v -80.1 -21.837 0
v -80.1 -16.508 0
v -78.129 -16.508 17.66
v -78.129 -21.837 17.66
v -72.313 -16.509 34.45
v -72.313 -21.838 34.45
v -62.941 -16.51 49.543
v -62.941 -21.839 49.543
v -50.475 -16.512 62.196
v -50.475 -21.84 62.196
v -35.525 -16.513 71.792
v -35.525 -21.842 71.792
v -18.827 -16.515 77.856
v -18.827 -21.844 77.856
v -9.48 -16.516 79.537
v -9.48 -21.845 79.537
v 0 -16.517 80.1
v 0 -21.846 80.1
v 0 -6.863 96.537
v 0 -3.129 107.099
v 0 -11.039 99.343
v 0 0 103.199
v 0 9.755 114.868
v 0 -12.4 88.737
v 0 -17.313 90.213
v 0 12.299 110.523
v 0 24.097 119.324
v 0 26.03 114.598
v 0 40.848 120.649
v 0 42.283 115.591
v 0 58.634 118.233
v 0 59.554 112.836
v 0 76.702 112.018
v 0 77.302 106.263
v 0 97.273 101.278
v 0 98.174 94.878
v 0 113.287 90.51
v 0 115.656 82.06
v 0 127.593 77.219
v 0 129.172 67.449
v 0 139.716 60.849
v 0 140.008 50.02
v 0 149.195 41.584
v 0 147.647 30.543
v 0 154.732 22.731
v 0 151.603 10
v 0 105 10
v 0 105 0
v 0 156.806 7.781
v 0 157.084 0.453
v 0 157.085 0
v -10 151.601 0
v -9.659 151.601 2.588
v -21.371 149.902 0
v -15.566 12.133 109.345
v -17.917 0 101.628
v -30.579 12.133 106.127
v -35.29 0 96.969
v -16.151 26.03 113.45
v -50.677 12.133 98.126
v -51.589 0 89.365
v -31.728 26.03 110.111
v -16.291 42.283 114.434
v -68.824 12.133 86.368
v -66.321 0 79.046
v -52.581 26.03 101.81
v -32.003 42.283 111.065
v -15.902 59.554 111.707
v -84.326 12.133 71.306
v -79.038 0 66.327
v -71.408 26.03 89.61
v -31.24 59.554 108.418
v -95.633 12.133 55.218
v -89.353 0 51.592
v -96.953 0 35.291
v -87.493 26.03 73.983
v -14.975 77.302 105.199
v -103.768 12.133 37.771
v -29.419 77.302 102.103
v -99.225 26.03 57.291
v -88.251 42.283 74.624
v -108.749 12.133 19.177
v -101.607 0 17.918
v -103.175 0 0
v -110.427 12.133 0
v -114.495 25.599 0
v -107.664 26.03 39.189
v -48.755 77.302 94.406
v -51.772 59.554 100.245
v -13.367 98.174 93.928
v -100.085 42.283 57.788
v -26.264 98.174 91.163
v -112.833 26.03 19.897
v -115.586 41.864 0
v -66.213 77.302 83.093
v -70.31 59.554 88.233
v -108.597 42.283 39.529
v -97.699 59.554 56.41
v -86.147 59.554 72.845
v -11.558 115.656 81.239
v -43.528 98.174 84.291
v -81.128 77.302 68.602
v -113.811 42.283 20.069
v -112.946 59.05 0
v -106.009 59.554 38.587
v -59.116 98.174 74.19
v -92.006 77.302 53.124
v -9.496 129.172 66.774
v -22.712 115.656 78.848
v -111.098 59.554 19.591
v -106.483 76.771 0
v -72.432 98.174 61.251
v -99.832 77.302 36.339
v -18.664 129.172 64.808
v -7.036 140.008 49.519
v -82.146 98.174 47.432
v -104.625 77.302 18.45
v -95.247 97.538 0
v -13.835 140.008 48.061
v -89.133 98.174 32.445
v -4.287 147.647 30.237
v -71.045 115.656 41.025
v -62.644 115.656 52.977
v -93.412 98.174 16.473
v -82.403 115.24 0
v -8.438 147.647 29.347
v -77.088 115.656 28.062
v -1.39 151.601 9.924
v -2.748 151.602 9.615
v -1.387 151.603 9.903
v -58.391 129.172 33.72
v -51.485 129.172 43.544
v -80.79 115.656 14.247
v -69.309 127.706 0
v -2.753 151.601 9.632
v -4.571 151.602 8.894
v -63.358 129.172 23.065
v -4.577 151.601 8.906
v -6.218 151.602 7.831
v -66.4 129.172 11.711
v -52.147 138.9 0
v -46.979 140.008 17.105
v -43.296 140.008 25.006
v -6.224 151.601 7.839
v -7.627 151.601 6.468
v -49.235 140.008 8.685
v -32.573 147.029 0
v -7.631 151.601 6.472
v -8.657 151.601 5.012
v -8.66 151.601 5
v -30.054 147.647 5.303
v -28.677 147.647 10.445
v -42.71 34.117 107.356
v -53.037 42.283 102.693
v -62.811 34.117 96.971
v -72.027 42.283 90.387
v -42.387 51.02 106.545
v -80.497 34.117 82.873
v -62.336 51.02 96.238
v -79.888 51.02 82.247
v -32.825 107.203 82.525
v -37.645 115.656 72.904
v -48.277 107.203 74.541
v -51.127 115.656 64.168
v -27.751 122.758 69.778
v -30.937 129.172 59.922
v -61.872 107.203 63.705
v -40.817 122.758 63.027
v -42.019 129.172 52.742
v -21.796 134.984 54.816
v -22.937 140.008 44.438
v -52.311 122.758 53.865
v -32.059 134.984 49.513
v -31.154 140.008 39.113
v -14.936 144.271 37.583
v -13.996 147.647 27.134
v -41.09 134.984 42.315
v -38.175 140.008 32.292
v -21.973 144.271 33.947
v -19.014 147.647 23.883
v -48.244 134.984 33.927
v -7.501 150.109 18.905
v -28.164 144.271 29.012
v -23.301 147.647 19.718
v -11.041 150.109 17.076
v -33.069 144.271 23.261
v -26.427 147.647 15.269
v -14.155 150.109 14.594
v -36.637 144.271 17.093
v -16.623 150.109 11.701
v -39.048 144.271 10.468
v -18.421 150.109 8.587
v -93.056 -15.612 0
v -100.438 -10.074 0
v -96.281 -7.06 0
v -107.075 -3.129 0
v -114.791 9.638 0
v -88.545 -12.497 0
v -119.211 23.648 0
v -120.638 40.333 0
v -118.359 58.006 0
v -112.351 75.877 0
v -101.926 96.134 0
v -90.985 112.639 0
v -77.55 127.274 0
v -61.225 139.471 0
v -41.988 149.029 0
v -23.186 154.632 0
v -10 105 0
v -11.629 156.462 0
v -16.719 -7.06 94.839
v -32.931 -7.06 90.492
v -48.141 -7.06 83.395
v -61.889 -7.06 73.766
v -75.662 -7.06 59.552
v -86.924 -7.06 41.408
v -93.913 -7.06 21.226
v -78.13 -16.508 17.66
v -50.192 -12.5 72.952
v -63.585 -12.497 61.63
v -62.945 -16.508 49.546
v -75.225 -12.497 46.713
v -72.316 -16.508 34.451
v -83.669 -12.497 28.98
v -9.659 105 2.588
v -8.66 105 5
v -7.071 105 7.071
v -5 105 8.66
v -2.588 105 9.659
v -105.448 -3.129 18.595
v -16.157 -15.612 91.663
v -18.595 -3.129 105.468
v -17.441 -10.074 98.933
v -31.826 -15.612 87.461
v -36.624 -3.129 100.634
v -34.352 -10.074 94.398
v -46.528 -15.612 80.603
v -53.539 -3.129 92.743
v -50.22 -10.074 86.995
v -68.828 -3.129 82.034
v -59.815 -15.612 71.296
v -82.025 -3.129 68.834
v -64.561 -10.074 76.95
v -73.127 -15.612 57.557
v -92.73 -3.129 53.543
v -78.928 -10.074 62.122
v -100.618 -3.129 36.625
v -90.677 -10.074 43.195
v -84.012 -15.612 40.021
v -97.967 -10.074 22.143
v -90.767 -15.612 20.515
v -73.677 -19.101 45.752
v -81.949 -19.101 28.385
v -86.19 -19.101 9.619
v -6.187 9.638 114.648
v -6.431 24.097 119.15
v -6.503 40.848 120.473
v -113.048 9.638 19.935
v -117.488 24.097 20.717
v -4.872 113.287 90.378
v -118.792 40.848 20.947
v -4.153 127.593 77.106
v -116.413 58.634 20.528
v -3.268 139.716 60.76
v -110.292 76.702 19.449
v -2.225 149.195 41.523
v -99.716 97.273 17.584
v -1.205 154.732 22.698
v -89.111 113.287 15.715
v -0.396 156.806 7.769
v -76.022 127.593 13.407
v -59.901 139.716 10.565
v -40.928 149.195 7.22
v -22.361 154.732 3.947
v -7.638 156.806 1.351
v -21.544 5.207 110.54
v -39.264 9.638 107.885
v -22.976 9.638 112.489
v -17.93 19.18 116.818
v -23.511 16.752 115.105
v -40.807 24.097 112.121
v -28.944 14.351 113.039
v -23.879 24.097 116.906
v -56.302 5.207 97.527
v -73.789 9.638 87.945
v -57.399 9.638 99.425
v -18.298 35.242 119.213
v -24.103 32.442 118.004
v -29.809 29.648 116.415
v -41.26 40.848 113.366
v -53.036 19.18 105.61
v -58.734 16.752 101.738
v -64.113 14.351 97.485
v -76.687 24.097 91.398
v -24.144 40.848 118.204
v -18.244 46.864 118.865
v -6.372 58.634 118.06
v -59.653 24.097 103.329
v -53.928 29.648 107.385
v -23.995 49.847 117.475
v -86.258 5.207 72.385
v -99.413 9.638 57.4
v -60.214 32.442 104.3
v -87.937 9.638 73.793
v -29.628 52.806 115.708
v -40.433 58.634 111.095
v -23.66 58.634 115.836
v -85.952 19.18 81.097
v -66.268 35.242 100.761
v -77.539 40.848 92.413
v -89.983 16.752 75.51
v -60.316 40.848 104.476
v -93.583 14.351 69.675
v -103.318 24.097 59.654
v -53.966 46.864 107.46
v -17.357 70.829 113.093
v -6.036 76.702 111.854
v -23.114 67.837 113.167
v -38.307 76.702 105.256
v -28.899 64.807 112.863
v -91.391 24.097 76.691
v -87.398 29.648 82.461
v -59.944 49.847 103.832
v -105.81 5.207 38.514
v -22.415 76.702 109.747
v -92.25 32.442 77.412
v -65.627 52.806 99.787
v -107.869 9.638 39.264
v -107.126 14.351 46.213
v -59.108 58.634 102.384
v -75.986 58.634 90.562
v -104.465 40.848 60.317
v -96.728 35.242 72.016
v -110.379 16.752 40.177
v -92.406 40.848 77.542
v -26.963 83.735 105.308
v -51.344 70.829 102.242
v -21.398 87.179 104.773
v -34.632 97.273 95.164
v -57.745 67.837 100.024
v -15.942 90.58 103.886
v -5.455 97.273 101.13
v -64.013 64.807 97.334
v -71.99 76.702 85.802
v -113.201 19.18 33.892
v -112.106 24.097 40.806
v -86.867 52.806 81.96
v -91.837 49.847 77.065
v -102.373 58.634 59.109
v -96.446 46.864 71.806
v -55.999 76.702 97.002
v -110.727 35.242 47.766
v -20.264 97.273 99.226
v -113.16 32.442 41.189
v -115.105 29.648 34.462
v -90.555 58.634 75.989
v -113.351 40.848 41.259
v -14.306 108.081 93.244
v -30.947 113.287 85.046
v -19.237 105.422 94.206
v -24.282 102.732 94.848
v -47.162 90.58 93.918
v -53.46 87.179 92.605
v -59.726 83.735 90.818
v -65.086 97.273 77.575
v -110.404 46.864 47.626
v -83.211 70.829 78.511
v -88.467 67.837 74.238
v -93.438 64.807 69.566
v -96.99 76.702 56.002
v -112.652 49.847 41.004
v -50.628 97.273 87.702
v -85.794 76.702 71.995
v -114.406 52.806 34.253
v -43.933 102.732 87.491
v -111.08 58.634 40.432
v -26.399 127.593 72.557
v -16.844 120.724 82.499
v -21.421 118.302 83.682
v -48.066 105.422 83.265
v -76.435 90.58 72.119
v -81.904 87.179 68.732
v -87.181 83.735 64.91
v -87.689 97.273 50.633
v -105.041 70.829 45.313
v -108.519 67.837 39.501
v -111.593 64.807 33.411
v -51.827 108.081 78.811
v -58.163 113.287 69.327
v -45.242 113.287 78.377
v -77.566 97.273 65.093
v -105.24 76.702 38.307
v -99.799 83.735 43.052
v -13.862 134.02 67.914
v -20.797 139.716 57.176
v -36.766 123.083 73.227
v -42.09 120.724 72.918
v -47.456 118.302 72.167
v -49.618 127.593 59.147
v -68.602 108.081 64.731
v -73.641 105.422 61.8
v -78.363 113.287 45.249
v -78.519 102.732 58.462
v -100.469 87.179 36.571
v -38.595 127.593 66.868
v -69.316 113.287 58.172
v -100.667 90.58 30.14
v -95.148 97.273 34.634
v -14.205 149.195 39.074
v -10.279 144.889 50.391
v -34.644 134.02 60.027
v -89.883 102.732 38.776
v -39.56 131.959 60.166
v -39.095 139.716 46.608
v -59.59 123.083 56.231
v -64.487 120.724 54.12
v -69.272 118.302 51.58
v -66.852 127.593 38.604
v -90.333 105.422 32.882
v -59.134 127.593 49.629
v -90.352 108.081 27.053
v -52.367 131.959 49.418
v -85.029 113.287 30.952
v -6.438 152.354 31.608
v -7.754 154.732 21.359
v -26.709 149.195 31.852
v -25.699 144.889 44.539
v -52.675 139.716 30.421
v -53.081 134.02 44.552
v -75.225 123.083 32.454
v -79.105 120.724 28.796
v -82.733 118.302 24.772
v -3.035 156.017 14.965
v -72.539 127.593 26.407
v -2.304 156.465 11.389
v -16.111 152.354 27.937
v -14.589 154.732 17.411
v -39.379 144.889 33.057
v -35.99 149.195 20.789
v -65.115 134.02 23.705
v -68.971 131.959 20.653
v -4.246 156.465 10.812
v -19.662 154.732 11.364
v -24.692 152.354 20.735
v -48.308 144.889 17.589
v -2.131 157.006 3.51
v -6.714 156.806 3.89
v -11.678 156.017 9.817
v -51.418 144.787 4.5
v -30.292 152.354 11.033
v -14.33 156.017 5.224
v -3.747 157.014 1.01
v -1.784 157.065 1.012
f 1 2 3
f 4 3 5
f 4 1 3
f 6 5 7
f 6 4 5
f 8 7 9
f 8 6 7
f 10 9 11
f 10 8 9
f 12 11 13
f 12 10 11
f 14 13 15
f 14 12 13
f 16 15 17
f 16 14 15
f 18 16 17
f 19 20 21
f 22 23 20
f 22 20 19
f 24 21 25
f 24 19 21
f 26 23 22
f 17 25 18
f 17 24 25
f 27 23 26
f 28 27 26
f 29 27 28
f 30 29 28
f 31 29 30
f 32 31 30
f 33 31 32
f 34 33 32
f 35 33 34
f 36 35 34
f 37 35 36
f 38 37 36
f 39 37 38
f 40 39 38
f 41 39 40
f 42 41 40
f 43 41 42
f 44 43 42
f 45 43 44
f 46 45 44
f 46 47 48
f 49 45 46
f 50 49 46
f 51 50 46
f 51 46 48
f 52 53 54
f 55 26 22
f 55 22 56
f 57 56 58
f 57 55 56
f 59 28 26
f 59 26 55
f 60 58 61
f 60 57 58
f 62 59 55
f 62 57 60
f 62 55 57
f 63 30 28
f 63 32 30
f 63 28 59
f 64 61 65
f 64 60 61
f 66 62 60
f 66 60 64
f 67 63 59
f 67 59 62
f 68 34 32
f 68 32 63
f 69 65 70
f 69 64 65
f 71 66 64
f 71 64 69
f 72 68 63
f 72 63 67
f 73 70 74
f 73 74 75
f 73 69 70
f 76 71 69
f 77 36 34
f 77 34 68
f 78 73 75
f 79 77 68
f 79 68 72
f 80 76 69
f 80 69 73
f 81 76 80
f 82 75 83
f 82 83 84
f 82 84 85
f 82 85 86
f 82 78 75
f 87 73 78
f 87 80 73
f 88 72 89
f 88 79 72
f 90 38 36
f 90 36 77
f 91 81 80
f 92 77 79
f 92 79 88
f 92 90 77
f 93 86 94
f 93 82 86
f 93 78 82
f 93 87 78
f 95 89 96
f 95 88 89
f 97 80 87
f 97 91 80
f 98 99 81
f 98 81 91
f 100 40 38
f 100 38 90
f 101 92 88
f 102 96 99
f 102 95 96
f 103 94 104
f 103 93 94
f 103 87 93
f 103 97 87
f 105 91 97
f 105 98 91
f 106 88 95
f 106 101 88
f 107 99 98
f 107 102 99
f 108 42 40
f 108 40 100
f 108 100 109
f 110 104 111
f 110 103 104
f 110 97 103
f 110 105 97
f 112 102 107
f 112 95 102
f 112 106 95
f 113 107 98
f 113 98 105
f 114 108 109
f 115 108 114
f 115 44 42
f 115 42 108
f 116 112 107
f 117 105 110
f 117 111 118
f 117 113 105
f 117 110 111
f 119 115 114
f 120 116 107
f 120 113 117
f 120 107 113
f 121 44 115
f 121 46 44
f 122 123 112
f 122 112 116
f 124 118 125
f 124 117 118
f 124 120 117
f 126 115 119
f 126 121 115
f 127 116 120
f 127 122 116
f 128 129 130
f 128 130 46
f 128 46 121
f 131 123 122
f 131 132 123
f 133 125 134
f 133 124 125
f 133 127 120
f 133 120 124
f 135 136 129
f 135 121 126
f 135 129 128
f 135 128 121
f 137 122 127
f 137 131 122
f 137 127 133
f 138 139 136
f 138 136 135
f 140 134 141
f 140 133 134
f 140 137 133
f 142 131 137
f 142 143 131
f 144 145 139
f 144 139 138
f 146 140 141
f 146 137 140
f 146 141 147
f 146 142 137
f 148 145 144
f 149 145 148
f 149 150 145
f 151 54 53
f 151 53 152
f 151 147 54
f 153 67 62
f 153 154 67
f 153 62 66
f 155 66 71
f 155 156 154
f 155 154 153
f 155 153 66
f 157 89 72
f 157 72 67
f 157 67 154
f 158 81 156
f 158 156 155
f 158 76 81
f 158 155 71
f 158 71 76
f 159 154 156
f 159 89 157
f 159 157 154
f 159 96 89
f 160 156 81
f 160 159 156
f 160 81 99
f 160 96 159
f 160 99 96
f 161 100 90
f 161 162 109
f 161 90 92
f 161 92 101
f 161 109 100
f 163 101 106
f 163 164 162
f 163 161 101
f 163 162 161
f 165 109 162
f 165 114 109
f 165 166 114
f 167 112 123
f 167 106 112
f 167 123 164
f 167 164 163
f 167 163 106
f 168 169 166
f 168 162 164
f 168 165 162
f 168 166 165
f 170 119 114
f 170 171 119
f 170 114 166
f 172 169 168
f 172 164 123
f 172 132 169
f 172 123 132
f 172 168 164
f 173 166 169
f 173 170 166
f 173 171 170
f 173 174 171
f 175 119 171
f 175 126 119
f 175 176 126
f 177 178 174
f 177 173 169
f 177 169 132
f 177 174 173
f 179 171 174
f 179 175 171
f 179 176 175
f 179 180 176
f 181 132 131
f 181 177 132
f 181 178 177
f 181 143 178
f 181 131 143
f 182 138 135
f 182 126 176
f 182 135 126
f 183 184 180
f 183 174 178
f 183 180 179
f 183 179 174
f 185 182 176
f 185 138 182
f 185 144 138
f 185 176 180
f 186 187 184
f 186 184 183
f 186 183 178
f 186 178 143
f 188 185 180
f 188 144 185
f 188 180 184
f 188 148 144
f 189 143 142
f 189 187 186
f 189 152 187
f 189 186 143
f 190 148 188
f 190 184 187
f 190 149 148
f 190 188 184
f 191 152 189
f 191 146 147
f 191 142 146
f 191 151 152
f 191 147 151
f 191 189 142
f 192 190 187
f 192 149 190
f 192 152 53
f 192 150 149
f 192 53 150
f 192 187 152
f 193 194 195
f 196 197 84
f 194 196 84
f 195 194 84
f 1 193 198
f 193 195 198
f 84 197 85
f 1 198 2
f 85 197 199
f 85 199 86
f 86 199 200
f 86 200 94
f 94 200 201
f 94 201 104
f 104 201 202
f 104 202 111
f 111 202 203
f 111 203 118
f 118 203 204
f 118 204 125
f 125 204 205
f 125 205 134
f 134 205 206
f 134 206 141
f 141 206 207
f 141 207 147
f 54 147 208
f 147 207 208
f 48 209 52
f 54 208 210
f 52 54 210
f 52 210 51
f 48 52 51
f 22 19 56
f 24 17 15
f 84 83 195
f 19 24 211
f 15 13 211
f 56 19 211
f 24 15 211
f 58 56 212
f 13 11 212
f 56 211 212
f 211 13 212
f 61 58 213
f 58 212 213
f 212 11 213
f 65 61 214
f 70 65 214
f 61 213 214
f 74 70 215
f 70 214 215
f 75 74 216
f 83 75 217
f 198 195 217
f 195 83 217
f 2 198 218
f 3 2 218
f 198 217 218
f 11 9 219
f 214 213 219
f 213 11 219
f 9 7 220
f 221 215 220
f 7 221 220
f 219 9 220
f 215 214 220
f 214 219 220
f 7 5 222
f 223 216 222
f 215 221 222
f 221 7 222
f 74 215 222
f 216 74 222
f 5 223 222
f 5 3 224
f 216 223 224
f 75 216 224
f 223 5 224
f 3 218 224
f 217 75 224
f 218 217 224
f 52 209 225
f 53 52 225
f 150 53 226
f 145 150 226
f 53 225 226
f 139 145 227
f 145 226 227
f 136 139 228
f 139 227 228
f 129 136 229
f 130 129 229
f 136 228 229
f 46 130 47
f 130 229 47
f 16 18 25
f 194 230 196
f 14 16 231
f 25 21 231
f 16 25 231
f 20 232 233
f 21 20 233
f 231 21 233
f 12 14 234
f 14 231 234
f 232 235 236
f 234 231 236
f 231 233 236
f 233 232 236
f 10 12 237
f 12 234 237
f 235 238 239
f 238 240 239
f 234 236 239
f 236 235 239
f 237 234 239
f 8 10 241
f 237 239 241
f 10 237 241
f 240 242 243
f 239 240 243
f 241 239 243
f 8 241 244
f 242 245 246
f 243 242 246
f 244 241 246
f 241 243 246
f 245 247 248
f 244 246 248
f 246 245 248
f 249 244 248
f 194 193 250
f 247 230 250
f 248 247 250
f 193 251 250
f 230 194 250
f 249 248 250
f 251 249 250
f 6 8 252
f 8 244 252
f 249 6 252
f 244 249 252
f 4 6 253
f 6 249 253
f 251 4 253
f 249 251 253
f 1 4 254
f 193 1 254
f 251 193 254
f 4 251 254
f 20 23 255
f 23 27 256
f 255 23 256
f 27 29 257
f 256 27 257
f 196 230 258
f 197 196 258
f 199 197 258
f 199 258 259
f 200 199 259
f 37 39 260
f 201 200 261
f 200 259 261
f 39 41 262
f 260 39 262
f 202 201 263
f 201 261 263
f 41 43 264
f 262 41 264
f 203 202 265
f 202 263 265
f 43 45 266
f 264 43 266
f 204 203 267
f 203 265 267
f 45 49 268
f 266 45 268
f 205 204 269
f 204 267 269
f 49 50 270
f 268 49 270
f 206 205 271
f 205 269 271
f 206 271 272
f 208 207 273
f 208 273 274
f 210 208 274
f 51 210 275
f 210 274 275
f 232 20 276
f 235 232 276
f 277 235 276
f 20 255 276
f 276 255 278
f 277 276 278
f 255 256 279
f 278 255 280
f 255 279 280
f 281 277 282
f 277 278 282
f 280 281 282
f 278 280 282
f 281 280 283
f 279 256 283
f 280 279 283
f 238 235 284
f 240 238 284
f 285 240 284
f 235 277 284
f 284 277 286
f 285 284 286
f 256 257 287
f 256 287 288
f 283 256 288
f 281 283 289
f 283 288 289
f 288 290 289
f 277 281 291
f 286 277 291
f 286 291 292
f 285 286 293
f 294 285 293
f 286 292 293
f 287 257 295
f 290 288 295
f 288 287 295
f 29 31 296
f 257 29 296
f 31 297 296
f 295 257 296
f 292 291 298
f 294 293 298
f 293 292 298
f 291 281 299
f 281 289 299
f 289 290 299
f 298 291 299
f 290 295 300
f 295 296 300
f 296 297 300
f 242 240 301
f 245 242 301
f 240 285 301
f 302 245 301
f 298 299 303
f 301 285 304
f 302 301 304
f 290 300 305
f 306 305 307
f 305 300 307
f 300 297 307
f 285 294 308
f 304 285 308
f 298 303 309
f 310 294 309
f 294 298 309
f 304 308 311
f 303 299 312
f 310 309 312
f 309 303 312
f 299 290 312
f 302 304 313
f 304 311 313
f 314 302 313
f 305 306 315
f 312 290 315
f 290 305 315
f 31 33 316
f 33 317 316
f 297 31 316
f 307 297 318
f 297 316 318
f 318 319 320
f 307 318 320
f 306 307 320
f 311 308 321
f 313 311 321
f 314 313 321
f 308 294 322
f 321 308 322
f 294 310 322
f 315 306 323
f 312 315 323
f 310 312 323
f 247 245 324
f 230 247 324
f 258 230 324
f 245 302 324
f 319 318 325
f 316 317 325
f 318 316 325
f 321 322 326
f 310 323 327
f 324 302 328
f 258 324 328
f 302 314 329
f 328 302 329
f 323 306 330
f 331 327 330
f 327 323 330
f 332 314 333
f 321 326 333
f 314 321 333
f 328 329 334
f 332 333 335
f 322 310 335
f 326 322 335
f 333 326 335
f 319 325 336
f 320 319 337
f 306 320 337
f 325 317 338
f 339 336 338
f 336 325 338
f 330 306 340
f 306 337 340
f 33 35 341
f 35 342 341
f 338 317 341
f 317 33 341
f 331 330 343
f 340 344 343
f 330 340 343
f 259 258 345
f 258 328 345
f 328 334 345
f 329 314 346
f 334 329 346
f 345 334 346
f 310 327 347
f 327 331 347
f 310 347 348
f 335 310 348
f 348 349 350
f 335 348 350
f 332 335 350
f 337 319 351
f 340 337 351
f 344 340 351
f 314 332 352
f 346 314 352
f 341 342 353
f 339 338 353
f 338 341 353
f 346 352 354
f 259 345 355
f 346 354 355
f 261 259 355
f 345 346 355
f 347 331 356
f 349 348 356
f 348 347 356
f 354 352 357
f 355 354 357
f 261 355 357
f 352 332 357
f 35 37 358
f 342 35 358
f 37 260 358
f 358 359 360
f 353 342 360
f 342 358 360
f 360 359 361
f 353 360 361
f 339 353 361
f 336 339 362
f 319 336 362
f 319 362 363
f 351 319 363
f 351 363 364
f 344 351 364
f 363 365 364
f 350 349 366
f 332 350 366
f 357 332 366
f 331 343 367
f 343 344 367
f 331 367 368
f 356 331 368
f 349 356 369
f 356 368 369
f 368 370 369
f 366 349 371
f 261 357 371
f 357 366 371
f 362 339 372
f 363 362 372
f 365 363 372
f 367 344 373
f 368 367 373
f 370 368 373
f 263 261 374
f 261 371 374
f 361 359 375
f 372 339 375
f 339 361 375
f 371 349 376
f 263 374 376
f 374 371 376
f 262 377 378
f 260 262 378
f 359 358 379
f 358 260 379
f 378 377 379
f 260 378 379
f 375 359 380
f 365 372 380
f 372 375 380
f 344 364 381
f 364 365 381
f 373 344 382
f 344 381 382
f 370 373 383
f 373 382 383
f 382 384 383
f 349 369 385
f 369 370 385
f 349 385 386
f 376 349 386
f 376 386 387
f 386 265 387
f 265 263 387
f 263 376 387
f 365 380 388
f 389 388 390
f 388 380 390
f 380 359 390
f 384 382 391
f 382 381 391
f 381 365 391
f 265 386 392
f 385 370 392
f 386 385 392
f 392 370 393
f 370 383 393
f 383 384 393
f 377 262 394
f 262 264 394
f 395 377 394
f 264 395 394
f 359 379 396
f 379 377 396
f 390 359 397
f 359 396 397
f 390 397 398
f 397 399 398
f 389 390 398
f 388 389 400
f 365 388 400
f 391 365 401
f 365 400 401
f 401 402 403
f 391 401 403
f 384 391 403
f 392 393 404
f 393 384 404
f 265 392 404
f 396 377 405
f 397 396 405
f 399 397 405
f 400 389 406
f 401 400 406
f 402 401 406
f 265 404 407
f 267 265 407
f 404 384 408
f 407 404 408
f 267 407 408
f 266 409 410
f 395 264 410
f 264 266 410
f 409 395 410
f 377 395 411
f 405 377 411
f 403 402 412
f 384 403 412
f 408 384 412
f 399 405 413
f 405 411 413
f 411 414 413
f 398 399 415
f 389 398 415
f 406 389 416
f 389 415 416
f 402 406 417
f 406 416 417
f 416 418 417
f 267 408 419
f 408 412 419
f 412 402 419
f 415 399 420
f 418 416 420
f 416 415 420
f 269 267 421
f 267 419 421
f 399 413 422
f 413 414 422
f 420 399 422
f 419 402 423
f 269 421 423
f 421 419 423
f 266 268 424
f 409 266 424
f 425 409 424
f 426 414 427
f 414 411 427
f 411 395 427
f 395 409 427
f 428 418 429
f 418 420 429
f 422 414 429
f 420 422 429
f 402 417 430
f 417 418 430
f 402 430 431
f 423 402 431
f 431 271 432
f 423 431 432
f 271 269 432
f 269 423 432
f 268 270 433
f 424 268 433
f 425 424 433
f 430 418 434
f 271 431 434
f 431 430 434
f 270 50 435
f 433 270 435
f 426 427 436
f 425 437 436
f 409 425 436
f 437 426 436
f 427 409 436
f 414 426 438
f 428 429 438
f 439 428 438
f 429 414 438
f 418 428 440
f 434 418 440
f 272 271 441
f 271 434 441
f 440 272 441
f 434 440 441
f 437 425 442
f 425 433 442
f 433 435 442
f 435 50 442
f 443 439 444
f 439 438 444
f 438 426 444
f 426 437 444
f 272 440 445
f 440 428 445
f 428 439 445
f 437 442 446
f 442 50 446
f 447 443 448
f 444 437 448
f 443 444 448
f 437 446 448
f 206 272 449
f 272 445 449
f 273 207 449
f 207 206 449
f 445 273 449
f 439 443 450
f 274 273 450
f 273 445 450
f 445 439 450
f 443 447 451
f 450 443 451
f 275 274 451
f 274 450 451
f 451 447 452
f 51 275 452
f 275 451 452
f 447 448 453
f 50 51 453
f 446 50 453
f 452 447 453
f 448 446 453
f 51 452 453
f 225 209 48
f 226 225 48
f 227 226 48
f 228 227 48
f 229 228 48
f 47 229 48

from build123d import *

# Parameters (mm, degrees)
SKETCH4_R           = 80.100145108
CUT_EXTRUDE2_DEPTH  = 20
CUT_EXTRUDE3_DEPTH  = 121.706010599
BOSS_EXTRUDE1_REACH = 54.085
SKETCH6_R           = 10
SKETCH7_W           = 348.912782296
SKETCH7_H           = 364.592796888
CUT_EXTRUDE4_DEPTH  = 159
SKETCH8_W           = 326.819124442
SKETCH8_H           = 332.894396065
CUT_EXTRUDE5_DEPTH  = 200


with BuildPart() as part:
    # Sketch3 → Revolve5 (revolve)
    with BuildSketch(Plane.XY):
        with BuildLine():
            Line((0.02453969, 157.084900749), (0.02453969, 152.084900749))
            add(Edge.make_bspline(
                [(-103.174583613, -2.6432e-05), (-114.760245555, 14.576189089), (-119.836740195, 49.27275863), (-101.45175109, 88.673946708), (-71.379831841, 134.479430747), (-29.75001244, 152.084900749), (0.02453969, 152.084900749)],
                knots=[0, 0, 0, 0, 0.250738493, 0.442513363, 0.587644713, 1, 1, 1, 1], degree=3))
            add(Edge.make_bspline(
                [(-103.174583613, -2.6432e-05), (-78.832759046, -30.064140021), (-33.458723298, -20.943389124), (0.02453969, -20.943389124)],
                knots=[0, 0, 0, 0, 1, 1, 1, 1], degree=3))
            Line((0.02453969, -20.943389124), (0.02453969, -25.943389124))
            add(Edge.make_bspline(
                [(0.02453969, -25.943389124), (-1.007843071, -25.943389124), (-3.05274325, -25.960735741), (-7.300680211, -26.054029266), (-12.774839269, -26.259816275), (-19.586870399, -26.581007249), (-28.911339242, -27.014332449), (-40.900445748, -27.386982651), (-55.443773123, -26.975342887), (-69.789912797, -25.08625158), (-81.278725906, -21.722461367), (-89.959801918, -17.60281584), (-96.13825684, -13.717797758), (-100.945853349, -9.752185194), (-104.534382709, -6.13029221), (-106.254478554, -4.141899361), (-107.07473695, -3.128814187)],
                knots=[-0.000194385, -0.000194385, -0.000194385, -0.000194385, 0.03106169, 0.062317764, 0.124829913, 0.187342062, 0.249854211, 0.37487851, 0.499902808, 0.624927106, 0.749951404, 0.812463553, 0.874975702, 0.937487851, 0.968743925, 1, 1, 1, 1], degree=3))
            add(Edge.make_bspline(
                [(-107.07473695, -3.128814187), (-107.861659129, -2.138767408), (-109.375579618, -0.100482773), (-112.095489807, 4.115600278), (-114.955951775, 9.644100323), (-117.55365357, 16.585319153), (-119.962688147, 26.134623726), (-121.103112226, 38.406473215), (-119.79356064, 53.088411426), (-116.089945574, 67.047457773), (-110.633897624, 80.23296506), (-104.034329909, 92.718986198), (-96.815301706, 104.751602155), (-88.512248671, 116.246845317), (-78.667704424, 126.697829164), (-67.464684594, 135.71357688), (-55.182594106, 143.280590712), (-42.054195525, 149.310974483), (-28.321126938, 153.731407172), (-14.204212291, 156.457352496), (-4.722534611, 157.084900749), (0.02453969, 157.084900749)],
                knots=[-0.000101258, -0.000101258, -0.000101258, -0.000101258, 0.015525324, 0.031151906, 0.06240507, 0.093658235, 0.124911399, 0.187417728, 0.249924056, 0.312430385, 0.374936714, 0.437443042, 0.499949371, 0.562455699, 0.624962028, 0.687468357, 0.749974685, 0.812481014, 0.874987343, 0.937493671, 1, 1, 1, 1], degree=3))
        make_face()
    revolve(axis=Axis((0.02453969, 171.610282588, 0), (0, -1, 0)))

    # Sketch4 → Cut-Extrude2 (cut)
    with BuildSketch(Plane(origin=(0, -30, 0), x_dir=(1, 0, 0), z_dir=(0, 1, 0))):
        Circle(SKETCH4_R)
    extrude(amount=CUT_EXTRUDE2_DEPTH, mode=Mode.SUBTRACT)

    # Sketch5 → Cut-Extrude3 (cut, through all)
    with BuildSketch(Plane(origin=(0, 0, 0), x_dir=(0, 0, -1), z_dir=(1, 0, 0))):
        with BuildLine():
            Line((-52.476481645, 8.136577936), (52.476481645, 8.136577936))
            ThreePointArc((52.476481645, 8.136577936), (58.138069368, 8.954648303), (63.336499377, 11.341935492))
            add(Edge.make_bspline(
                [(63.336499377, 11.341935492), (82.622361185, 23.812864951), (78.746201445, 39.317958114)],
                knots=[5.637022825, 5.637022825, 5.637022825, 6.404500867, 6.404500867, 6.404500867], degree=2, weights=[1, 0.927271268, 1]))
            ThreePointArc((78.746201445, 39.317958114), (77.929706658, 42.769255575), (77.20089719, 46.240127895))
            add(Edge.make_bspline(
                [(70.494135614, 63.047069033), (72.356334923, 60.10156835), (75.045149162, 54.673263207), (76.692738831, 48.822390655), (77.20089719, 46.240127895)],
                knots=[0.168181527, 0.168181527, 0.168181527, 0.168181527, 0.552818848, 0.845617793, 0.845617793, 0.845617793, 0.845617793], degree=3))
            ThreePointArc((70.494135614, 63.047069033), (68.293855497, 66.646255249), (66.203011989, 70.31009851))
            add(Edge.make_bspline(
                [(66.203011989, 70.31009851), (-4.427969211, 198.528374497), (-67.022107814, 68.723719713)],
                knots=[0.328274459, 0.328274459, 0.328274459, 2.851830568, 2.851830568, 2.851830568], degree=2, weights=[1, 0.304123557, 1]))
            ThreePointArc((-67.022107814, 68.723719713), (-68.159373057, 66.423614108), (-69.341813393, 64.146402461))
            add(Edge.make_bspline(
                [(-69.341813393, 64.146402461), (-73.061653072, 57.152172395), (-75.898874077, 49.79082496), (-77.836559233, 42.105665134)],
                knots=[0.114274397, 0.114274397, 0.114274397, 0.114274397, 1, 1, 1, 1], degree=3))
            add(Edge.make_bspline(
                [(-77.836559233, 42.105665134), (-84.680776254, 25.143909909), (-63.336499377, 11.341935492)],
                knots=[2.947295522, 2.947295522, 2.947295522, 3.787755136, 3.787755136, 3.787755136], degree=2, weights=[1, 0.91299521, 1]))
            ThreePointArc((-63.336499377, 11.341935492), (-58.138069368, 8.954648303), (-52.476481645, 8.136577936))
        make_face()
    extrude(amount=CUT_EXTRUDE3_DEPTH, mode=Mode.SUBTRACT)

    # Sketch6 → Boss-Extrude1 (add, up to next)
    with BuildSketch(Plane(origin=(0, 105, 0), x_dir=(1, 0, 0), z_dir=(0, 1, 0)), mode=Mode.PRIVATE) as boss_extrude1_sk1:
        Circle(SKETCH6_R)
    boss_extrude1_tool1 = extrude(boss_extrude1_sk1.sketch, amount=BOSS_EXTRUDE1_REACH, mode=Mode.PRIVATE) - part.part
    add(boss_extrude1_tool1.solids().sort_by_distance((0, 105, 0))[0])

    # Sketch7 → Cut-Extrude4 (cut)
    with BuildSketch(Plane.XY):
        Rectangle(SKETCH7_W, SKETCH7_H)
    extrude(amount=-CUT_EXTRUDE4_DEPTH, mode=Mode.SUBTRACT)

    # Sketch8 → Cut-Extrude5 (cut)
    with BuildSketch(Plane(origin=(0, 0, 0), x_dir=(0, 0, -1), z_dir=(1, 0, 0))):
        with Locations((0, -2.6432e-05)):
            Rectangle(SKETCH8_W, SKETCH8_H)
    extrude(amount=CUT_EXTRUDE5_DEPTH, mode=Mode.SUBTRACT)


solid = part.part
